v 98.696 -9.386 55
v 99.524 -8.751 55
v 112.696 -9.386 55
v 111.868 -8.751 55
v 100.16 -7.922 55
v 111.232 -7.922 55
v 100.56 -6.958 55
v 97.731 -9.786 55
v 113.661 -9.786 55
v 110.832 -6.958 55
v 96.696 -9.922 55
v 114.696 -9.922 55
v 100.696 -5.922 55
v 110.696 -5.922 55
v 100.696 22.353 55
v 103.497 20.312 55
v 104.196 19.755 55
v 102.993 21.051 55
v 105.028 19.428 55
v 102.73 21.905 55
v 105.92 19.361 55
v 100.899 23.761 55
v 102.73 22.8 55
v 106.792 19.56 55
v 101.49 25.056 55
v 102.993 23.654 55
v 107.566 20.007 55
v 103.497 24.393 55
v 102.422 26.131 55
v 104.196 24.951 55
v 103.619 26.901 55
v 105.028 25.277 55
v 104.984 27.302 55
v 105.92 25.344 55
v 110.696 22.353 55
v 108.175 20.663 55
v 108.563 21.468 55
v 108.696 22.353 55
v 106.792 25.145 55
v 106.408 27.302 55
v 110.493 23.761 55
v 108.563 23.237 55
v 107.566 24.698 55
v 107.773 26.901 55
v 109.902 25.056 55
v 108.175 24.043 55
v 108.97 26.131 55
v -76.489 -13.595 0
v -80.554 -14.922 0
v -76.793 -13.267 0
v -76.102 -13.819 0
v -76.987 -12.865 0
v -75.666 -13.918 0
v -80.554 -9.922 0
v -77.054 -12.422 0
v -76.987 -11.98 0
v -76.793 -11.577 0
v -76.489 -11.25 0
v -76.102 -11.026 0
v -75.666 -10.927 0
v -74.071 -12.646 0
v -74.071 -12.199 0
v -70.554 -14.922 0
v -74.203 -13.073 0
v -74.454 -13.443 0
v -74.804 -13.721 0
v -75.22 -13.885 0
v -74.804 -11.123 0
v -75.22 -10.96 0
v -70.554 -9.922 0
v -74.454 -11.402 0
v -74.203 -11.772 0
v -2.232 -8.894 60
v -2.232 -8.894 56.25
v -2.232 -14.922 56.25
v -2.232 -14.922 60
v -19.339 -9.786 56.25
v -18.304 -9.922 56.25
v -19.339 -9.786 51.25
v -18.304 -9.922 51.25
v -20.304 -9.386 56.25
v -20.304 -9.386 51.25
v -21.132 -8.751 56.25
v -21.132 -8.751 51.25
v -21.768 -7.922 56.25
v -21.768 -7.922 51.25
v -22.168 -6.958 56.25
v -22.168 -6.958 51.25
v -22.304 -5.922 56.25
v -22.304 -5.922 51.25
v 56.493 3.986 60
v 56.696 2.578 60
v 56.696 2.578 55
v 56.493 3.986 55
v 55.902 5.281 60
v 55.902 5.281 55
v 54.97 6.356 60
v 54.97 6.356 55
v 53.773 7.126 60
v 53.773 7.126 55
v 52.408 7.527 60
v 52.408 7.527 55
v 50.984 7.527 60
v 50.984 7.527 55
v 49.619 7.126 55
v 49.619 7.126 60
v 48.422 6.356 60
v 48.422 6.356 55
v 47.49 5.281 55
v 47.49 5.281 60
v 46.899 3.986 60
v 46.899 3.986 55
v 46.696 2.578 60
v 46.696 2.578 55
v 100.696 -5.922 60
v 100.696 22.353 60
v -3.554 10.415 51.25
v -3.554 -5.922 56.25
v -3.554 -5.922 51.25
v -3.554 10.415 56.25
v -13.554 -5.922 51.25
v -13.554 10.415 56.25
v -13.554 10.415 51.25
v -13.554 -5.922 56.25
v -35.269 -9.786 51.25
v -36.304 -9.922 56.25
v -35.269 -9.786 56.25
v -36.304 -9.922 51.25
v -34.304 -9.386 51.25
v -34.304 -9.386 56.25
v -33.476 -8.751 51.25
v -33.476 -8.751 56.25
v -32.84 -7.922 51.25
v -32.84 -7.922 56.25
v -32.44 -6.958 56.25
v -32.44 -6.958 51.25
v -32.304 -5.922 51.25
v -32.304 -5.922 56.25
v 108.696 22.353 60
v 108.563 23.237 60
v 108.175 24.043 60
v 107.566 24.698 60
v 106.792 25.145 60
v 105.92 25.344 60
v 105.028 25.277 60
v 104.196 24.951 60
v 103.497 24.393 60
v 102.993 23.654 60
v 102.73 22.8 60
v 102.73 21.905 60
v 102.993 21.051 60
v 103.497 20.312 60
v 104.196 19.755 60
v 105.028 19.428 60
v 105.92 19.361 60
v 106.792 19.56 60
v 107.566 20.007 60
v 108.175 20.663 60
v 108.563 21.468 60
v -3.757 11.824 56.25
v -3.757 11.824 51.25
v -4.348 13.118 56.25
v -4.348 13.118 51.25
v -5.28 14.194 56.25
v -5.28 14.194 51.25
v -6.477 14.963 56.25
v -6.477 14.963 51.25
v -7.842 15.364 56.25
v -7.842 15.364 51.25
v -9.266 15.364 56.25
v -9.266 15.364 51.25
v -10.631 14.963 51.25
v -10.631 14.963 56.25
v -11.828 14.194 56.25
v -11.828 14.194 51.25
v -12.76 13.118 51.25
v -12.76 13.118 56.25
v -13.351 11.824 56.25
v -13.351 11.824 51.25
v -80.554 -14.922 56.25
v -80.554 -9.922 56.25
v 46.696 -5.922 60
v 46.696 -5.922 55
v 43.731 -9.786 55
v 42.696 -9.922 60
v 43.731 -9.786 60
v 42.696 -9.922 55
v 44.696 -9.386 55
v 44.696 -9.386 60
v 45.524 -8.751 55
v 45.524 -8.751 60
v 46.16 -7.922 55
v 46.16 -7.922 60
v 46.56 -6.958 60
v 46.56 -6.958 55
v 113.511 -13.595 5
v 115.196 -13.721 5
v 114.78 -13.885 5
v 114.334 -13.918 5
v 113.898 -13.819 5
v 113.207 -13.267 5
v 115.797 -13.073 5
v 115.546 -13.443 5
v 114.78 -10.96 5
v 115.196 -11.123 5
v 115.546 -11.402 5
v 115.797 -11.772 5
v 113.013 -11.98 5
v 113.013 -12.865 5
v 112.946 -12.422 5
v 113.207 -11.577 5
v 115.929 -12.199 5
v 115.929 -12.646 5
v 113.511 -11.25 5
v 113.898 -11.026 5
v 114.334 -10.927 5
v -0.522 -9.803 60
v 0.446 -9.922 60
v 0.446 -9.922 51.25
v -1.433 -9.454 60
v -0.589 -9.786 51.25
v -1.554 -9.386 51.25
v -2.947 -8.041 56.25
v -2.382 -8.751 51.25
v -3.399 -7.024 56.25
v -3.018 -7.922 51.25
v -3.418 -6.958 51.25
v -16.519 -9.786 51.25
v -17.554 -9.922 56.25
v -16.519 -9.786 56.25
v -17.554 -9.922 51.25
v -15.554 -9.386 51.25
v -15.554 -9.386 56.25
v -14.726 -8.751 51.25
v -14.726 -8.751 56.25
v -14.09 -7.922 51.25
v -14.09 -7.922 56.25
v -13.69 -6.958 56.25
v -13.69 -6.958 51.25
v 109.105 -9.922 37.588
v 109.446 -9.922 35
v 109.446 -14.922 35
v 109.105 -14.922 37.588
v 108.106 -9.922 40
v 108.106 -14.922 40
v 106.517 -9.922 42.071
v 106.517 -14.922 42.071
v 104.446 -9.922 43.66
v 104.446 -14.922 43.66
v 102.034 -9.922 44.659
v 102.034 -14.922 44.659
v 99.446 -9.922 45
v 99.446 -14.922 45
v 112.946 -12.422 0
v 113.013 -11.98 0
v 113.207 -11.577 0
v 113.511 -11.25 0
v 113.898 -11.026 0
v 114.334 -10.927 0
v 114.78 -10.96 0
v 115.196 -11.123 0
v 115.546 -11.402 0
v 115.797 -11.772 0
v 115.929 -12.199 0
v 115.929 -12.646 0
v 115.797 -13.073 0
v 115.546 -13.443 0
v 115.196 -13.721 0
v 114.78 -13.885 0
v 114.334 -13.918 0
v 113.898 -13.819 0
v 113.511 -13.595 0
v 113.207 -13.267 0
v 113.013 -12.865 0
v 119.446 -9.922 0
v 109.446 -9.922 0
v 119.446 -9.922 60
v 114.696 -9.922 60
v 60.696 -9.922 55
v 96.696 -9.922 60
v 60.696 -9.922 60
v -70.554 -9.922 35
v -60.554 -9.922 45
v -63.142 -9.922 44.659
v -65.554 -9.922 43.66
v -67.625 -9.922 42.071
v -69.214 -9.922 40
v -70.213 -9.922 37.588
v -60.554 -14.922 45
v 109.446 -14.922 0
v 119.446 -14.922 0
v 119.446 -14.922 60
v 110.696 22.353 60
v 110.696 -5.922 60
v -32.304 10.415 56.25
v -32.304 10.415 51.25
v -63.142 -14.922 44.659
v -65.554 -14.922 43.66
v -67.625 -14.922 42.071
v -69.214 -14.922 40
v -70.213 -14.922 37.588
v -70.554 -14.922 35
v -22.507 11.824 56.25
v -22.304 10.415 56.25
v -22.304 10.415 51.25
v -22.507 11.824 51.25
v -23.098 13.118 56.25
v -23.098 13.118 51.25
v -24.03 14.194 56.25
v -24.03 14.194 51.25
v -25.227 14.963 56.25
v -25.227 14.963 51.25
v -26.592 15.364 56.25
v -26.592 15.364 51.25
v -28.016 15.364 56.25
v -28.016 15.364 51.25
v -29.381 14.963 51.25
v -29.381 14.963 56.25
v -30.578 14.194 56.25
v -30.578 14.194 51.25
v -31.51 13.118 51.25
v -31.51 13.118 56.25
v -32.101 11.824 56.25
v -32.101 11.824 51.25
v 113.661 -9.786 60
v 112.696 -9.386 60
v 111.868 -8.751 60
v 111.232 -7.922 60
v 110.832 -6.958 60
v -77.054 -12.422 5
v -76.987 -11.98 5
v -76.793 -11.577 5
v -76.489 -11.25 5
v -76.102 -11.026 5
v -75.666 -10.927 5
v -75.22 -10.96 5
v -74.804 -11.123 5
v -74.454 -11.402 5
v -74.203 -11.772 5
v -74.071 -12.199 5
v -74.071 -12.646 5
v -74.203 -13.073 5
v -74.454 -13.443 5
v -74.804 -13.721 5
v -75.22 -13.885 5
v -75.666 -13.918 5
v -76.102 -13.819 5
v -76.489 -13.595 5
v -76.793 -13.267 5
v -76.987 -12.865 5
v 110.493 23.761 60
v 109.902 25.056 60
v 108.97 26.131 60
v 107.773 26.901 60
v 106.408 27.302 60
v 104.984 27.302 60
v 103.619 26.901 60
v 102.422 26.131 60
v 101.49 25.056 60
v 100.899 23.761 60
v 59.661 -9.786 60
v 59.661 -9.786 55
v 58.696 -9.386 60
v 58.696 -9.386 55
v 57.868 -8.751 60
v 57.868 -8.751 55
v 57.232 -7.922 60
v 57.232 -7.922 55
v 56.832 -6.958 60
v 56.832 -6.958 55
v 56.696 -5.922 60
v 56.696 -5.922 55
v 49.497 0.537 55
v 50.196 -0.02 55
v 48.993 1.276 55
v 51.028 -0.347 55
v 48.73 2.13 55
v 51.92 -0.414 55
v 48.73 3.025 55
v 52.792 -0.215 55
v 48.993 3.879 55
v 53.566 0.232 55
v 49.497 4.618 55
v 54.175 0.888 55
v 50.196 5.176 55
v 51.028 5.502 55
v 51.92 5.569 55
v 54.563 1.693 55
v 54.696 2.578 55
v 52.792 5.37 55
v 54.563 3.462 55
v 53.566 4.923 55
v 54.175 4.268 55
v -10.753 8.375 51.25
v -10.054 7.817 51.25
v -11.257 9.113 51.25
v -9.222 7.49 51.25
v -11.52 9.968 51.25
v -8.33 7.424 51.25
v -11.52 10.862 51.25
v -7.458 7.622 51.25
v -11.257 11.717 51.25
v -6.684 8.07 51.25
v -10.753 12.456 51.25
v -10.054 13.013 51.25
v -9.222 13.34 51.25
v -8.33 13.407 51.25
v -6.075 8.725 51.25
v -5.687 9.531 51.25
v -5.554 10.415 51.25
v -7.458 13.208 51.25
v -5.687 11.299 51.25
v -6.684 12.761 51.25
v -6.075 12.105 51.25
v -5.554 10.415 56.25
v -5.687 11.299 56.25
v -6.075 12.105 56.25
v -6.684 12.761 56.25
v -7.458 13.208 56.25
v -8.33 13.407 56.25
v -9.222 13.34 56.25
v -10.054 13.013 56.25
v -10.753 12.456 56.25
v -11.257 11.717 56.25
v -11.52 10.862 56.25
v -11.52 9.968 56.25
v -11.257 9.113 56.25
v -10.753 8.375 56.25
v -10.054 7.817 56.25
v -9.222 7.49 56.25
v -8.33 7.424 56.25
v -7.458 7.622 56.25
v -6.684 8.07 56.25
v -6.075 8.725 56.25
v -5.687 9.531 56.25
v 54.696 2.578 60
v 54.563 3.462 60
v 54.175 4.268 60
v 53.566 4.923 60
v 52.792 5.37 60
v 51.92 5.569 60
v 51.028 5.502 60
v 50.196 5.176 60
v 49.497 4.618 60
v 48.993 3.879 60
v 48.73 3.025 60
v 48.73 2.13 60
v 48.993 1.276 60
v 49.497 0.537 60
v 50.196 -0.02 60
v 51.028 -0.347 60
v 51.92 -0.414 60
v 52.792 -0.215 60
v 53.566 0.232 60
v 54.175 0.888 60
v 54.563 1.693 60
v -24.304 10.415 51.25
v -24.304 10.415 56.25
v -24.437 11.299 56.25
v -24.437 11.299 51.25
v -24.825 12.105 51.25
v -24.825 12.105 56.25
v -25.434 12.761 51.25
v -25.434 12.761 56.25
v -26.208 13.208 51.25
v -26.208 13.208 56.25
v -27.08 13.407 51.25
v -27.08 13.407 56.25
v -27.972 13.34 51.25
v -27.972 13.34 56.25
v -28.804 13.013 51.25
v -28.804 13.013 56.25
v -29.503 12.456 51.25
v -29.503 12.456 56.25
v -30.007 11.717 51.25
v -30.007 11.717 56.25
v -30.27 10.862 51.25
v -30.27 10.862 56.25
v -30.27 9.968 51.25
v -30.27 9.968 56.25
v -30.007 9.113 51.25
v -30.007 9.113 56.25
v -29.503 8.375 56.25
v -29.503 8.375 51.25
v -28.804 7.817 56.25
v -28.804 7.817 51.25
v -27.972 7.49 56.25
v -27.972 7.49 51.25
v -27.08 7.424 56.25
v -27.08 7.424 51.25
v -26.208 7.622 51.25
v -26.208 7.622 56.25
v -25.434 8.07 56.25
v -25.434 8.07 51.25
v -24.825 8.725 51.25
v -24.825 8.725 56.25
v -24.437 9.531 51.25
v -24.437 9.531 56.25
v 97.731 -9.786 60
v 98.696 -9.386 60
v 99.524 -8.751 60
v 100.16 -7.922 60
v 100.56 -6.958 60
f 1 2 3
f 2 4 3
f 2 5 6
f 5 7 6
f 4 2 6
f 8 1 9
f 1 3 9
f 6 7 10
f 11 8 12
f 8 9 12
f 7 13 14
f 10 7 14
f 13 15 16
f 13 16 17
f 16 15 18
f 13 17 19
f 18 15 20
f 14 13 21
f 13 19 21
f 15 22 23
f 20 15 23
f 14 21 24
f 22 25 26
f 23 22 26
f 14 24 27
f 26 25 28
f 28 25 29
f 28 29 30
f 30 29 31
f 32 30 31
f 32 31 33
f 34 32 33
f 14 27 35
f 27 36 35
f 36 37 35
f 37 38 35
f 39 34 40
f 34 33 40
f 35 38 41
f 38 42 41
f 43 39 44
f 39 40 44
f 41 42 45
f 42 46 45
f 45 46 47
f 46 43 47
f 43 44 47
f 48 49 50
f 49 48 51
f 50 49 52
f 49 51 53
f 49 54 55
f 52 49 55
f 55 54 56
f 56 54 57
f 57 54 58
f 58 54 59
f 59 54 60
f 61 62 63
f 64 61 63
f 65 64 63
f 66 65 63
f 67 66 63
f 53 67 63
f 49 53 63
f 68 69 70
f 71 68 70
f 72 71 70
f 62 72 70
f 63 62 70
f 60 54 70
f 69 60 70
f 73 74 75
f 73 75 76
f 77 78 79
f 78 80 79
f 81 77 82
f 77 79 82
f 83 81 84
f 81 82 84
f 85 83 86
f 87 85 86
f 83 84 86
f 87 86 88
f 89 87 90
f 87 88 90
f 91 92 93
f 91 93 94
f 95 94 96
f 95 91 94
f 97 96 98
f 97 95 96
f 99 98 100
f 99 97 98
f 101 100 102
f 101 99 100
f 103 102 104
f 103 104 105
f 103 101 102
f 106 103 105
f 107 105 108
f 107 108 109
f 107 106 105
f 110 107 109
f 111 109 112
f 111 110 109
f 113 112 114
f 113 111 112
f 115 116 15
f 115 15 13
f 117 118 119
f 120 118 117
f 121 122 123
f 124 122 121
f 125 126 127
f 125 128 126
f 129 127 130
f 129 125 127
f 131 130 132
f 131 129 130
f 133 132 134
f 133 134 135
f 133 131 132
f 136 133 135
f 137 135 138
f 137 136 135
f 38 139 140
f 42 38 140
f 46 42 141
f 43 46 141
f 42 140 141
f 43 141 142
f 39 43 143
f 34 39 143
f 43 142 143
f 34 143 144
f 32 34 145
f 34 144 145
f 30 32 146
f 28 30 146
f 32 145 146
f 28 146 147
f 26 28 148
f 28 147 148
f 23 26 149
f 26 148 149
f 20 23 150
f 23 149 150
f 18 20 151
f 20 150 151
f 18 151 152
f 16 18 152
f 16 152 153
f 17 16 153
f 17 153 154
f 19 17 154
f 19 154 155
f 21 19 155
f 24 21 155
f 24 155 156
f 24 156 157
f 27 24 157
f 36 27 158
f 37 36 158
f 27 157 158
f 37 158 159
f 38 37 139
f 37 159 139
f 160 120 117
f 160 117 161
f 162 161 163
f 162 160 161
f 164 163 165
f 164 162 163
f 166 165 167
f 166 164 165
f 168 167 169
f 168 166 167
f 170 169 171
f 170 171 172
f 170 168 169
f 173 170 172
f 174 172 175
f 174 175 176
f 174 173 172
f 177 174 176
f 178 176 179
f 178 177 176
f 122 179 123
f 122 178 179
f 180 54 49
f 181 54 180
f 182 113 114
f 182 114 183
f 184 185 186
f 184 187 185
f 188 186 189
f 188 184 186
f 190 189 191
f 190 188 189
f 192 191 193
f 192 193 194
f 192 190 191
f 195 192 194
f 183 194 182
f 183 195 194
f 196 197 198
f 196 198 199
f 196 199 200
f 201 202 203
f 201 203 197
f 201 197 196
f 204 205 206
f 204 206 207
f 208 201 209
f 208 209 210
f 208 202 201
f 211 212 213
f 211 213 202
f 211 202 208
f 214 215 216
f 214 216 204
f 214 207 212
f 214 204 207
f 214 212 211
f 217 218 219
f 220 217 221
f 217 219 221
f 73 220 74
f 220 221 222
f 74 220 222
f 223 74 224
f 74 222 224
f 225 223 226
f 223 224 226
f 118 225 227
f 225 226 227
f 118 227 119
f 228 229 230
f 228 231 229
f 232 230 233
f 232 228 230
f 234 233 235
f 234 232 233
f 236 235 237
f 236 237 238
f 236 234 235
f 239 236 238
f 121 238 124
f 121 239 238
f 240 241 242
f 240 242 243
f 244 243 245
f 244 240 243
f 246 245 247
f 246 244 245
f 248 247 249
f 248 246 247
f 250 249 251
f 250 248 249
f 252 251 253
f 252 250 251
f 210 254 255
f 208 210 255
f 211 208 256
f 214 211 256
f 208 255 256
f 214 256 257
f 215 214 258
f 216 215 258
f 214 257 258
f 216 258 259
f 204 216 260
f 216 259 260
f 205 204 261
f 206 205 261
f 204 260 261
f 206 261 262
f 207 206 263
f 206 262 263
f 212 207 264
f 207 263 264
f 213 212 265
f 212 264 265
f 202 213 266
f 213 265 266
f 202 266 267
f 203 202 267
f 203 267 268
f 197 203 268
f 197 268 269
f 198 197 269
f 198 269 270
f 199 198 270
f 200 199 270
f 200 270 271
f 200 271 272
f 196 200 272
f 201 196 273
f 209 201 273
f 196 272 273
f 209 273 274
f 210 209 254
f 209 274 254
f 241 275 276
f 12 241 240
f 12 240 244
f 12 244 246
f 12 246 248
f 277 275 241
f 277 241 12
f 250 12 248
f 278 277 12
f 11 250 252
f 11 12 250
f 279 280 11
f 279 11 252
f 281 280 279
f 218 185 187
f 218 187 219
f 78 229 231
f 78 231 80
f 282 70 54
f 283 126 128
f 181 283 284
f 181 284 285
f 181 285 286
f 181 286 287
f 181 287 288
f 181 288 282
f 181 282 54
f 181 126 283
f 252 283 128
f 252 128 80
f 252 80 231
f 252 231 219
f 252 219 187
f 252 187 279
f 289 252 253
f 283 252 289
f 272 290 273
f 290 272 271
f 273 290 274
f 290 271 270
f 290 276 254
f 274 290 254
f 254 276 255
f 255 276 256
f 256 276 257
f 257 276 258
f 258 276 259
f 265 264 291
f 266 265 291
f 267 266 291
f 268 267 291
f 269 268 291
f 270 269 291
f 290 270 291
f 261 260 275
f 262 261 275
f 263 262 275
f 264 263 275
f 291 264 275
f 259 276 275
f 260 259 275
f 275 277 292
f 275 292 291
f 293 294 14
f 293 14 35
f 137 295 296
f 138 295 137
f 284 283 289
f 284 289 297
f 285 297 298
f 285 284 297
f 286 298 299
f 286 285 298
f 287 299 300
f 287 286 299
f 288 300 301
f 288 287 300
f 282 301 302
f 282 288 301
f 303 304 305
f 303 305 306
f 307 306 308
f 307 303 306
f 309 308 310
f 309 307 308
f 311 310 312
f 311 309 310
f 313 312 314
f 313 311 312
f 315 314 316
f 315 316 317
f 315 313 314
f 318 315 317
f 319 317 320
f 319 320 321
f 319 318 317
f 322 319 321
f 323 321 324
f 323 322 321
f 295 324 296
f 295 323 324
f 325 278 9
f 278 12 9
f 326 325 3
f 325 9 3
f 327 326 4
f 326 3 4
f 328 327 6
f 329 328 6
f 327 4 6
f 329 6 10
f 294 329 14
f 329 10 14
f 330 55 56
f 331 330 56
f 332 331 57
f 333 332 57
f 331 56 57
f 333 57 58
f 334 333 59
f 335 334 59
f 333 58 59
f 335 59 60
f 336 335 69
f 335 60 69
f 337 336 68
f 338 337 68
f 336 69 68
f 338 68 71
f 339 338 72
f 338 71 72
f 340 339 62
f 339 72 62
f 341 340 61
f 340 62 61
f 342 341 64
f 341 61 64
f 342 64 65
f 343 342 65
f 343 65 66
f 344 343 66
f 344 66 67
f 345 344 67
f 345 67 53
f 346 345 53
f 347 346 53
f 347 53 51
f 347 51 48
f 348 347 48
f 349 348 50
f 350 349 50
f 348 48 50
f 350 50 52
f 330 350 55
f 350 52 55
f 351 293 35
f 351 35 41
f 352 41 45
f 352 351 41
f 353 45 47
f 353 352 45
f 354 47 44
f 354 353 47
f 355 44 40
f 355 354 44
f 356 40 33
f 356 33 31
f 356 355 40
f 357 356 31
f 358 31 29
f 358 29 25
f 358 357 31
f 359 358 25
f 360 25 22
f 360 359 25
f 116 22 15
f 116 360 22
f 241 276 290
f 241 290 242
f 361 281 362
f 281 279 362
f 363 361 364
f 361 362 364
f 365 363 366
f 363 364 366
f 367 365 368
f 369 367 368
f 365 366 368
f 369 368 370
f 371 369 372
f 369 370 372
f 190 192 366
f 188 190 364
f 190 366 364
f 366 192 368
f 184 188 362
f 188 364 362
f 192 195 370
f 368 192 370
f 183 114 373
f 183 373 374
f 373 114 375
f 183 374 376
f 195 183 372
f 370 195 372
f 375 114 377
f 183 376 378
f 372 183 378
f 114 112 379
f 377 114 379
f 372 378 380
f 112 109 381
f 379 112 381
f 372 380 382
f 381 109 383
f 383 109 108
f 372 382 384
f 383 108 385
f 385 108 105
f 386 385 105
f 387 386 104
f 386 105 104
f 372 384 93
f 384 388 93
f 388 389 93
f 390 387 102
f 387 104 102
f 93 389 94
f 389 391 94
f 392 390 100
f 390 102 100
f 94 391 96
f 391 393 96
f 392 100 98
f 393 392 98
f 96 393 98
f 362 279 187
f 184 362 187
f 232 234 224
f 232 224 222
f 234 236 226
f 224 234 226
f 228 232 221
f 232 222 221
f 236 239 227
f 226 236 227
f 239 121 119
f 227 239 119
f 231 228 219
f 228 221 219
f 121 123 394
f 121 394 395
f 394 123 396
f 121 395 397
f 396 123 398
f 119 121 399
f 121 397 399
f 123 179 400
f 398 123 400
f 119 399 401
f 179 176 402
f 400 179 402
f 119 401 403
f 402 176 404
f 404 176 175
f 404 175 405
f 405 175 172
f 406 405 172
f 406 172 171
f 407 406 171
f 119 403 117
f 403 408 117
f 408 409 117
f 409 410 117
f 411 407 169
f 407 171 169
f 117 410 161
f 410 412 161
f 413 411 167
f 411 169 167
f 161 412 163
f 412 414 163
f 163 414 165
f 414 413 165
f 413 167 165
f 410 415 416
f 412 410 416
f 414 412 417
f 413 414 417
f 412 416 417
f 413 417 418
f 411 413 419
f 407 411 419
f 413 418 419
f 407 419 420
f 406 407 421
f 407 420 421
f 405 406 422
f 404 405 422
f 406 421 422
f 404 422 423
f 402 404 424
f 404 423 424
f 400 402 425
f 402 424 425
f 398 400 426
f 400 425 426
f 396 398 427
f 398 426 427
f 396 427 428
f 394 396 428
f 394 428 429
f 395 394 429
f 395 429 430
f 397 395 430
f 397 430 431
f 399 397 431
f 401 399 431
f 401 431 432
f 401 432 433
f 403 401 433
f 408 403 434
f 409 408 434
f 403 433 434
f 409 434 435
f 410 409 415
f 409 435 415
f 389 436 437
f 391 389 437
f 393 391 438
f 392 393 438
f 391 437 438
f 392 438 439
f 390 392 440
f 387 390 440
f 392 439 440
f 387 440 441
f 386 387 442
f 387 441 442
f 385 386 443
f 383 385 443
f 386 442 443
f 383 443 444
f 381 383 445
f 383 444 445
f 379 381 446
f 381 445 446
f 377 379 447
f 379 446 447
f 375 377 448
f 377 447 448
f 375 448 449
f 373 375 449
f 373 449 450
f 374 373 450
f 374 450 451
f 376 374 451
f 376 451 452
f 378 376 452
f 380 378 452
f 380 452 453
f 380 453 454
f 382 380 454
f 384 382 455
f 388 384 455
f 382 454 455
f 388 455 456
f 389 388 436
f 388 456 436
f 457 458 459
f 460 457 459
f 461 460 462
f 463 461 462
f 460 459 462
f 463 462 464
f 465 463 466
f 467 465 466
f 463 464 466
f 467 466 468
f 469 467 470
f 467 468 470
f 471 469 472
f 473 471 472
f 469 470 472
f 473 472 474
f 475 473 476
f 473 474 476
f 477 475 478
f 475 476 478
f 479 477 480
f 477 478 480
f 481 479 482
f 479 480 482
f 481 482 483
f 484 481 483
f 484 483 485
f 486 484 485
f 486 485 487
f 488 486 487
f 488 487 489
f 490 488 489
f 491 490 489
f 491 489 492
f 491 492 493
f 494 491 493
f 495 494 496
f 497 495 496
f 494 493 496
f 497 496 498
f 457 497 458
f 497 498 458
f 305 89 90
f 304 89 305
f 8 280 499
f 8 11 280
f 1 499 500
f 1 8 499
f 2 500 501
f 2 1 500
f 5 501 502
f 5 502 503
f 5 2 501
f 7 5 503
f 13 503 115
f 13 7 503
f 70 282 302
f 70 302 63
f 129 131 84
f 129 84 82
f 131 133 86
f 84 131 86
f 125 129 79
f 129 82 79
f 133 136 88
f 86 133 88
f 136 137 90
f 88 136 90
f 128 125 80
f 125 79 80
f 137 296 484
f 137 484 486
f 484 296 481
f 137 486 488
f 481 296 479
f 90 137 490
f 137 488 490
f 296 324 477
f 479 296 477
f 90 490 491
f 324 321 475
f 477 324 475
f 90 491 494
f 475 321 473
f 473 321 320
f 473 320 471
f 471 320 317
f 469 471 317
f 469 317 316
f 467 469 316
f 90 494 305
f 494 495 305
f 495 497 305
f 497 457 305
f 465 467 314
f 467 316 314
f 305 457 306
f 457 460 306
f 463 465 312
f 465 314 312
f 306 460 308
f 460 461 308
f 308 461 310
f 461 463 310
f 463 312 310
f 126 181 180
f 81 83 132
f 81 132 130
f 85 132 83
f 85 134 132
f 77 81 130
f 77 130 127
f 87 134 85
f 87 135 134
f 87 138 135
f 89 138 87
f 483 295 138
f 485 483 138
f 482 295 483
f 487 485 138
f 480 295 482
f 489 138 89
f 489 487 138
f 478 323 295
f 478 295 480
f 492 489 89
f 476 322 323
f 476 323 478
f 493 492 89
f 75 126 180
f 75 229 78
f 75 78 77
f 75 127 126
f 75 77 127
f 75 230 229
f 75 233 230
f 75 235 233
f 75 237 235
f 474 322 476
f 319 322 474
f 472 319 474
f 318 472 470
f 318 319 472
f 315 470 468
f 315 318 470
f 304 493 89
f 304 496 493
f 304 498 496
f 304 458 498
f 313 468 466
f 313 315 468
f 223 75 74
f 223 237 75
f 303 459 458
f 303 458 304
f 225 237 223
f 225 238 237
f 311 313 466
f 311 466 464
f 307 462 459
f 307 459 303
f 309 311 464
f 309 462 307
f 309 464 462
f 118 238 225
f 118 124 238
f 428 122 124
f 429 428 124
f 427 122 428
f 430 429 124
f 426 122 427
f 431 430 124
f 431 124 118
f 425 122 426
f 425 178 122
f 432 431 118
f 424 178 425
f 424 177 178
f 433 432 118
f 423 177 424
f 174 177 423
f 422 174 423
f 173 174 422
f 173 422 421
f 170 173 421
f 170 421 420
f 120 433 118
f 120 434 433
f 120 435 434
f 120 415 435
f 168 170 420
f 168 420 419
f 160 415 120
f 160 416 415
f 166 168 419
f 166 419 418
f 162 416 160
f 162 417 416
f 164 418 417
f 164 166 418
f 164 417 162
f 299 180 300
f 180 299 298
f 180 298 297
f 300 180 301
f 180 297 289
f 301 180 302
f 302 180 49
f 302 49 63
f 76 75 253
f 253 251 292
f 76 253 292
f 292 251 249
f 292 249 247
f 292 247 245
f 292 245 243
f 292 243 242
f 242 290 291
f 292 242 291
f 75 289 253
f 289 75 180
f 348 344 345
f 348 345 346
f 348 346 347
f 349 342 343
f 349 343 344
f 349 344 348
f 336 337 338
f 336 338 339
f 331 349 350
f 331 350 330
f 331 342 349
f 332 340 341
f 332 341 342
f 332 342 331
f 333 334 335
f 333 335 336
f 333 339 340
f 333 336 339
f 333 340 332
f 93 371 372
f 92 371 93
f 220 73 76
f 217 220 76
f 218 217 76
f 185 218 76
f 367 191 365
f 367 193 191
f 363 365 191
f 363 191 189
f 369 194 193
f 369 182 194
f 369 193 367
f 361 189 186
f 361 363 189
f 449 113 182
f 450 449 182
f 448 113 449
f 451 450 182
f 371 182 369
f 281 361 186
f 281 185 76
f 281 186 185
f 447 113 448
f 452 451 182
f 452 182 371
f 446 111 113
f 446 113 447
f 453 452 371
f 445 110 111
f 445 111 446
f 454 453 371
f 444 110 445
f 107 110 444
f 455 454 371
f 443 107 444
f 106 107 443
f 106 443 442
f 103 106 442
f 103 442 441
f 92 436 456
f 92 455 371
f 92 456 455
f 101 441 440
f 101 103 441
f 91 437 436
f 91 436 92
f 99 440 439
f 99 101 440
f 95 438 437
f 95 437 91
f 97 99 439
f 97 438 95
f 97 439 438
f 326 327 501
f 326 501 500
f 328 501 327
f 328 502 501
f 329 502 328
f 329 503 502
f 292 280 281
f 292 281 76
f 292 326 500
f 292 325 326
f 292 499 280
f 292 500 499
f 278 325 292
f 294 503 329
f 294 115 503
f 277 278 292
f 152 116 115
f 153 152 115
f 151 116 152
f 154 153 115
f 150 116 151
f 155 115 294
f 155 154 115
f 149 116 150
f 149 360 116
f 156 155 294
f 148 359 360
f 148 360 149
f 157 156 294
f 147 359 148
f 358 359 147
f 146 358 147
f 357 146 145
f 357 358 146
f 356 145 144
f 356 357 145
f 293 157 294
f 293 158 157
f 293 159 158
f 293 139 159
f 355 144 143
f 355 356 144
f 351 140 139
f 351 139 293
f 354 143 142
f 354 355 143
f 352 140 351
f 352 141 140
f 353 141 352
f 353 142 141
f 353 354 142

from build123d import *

# Parameters (mm, degrees)
BOSS_EXTRUDE1_DEPTH     = 40
SKETCH2_R               = 24
BOSS_EXTRUDE2_DEPTH     = 40
SKETCH3_R               = 24
BOSS_EXTRUDE3_DEPTH     = 40
SCALE1_SCALE            = 0.125
FILLET3_R               = 4
FILLET4_R               = 4
CUT_EXTRUDE1_DEPTH      = 38.275
CUT_EXTRUDE1_DEPTH_BACK = 6
SKETCH5_OUTSIDE_W       = 249.408
SKETCH5_OUTSIDE_H       = 169.408
CUT_EXTRUDE2_DEPTH      = 38.275
CUT_EXTRUDE2_DEPTH_BACK = 6
SKETCH7_R               = 1.5
CUT_EXTRUDE3_DEPTH      = 5


with BuildPart() as part:
    # Sketch1 → Boss-Extrude1 (new body)
    with BuildSketch(Plane(origin=(0, 0, 0), x_dir=(1, 0, 0), z_dir=(0, 1, 0))):
        Polygon((-173.422280891, 480), (-173.422280891, 450), (-800, 450), (-800, -450), (-173.422280891, -450), (-173.422280891, -480), (800, -480), (800, 480), align=None)
    extrude(amount=-BOSS_EXTRUDE1_DEPTH)

    # Sketch2 → Boss-Extrude2 (add)
    with BuildSketch(Plane.XY.offset(480)):
        with BuildLine():
            Line((218, 0), (298, 0))
            Line((298, 0), (298, 100))
            ThreePointArc((298, 100), (258, 140), (218, 100))
            Line((218, 100), (218, 0))
        make_face()
        with Locations((258, 100)):
            Circle(SKETCH2_R, mode=Mode.SUBTRACT)
        with BuildLine():
            Line((650, 258.2), (650, 0))
            Line((650, 0), (730, 0))
            Line((730, 0), (730, 258.2))
            ThreePointArc((730, 258.2), (690, 298.2), (650, 258.2))
        make_face()
        with Locations((690, 258.2)):
            Circle(SKETCH2_R, mode=Mode.SUBTRACT)
        Polygon((650, 0), (298, 0), (218, 0), (-173.422280891, 0), (-173.422280891, -40), (800, -40), (800, 0), (730, 0), align=None)
    extrude(amount=-BOSS_EXTRUDE2_DEPTH)

    # Mirror1: part across plane


with BuildPart() as part_1:
    add(part.part)
    add(part.part.mirror(Plane.XY))

    # Sketch3 → Boss-Extrude3 (add)
    with BuildSketch(Plane.XY.offset(450)):
        with BuildLine():
            Line((-414, 0), (-334, 0))
            Line((-334, 0), (-334, 162.7))
            ThreePointArc((-334, 162.7), (-374, 202.7), (-414, 162.7))
            Line((-414, 162.7), (-414, 0))
        make_face()
        with Locations((-374, 162.7)):
            Circle(SKETCH3_R, mode=Mode.SUBTRACT)
        with BuildLine():
            Line((-264, 0), (-184, 0))
            Line((-184, 0), (-184, 162.7))
            ThreePointArc((-184, 162.7), (-224, 202.7), (-264, 162.7))
            Line((-264, 162.7), (-264, 0))
        make_face()
        with Locations((-224, 162.7)):
            Circle(SKETCH3_R, mode=Mode.SUBTRACT)
    boss_extrude3 = extrude(amount=-BOSS_EXTRUDE3_DEPTH)

    # Mirror2: Boss-Extrude3 across plane
    add(boss_extrude3.mirror(Plane.XY))


with BuildPart() as part_2:
    # Scale1: scaled about (22.22402446, -11.339866564, 0)
    add(part_1.part.scale(SCALE1_SCALE).moved(Location((19.446021402, -9.922383243, 0))))

    # Fillet3
    fillet3_edges = [part_2.edges().sort_by_distance(p)[0] for p in [
        (-32.303978598, -9.922383243, 53.75),
        (-13.553978598, -9.922383243, 53.75),
        (-32.303978598, -9.922383243, -53.75),
        (-13.553978598, -9.922383243, -53.75),
        (46.696021403, -9.922383243, 57.5),
        (100.696021403, -9.922383243, 57.5),
        (100.696021403, -9.922383243, -57.5),
        (46.696021403, -9.922383243, -57.5),
    ]]
    fillet(fillet3_edges, radius=FILLET3_R)

    # Fillet4
    fillet4_edges = [part_2.edges().sort_by_distance(p)[0] for p in [
        (-3.553978598, -9.922383243, -53.75),
        (-22.303978598, -9.922383243, -53.75),
        (56.696021403, -9.922383243, -57.5),
        (110.696021402, -9.922383243, -57.5),
        (110.696021402, -9.922383243, 57.5),
        (56.696021403, -9.922383243, 57.5),
        (-3.553978598, -9.922383243, 53.75),
        (-22.303978598, -9.922383243, 53.75),
    ]]
    fillet(fillet4_edges, radius=FILLET4_R)

    # Sketch4 → Cut-Extrude1 (cut, two sides)
    with BuildSketch(Plane(origin=(0, -9.922383244, 0), x_dir=(1, 0, 0), z_dir=(0, 1, 0))) as cut_extrude1_sk:
        with BuildLine():
            Line((-60.553978598, 45), (99.446021402, 45))
            ThreePointArc((99.446021402, 45), (106.517089214, 42.071067812), (109.446021402, 35))
            Line((109.446021402, 35), (109.446021402, -35))
            ThreePointArc((109.446021402, -35), (106.517089214, -42.071067812), (99.446021402, -45))
            Line((99.446021402, -45), (-60.553978598, -45))
            ThreePointArc((-60.553978598, -45), (-67.62504641, -42.071067812), (-70.553978598, -35))
            Line((-70.553978598, -35), (-70.553978598, 35))
            ThreePointArc((-70.553978598, 35), (-67.62504641, 42.071067812), (-60.553978598, 45))
        make_face()
    extrude(amount=CUT_EXTRUDE1_DEPTH, mode=Mode.SUBTRACT)
    extrude(cut_extrude1_sk.sketch, amount=-CUT_EXTRUDE1_DEPTH_BACK, mode=Mode.SUBTRACT)

    # Sketch5 outside → Cut-Extrude2 (cut, two sides)
    with BuildSketch(Plane(origin=(0, -9.922383244, 0), x_dir=(1, 0, 0), z_dir=(0, 1, 0))) as cut_extrude2_sk:
        with Locations((19.446, 0)):
            Rectangle(SKETCH5_OUTSIDE_W, SKETCH5_OUTSIDE_H)
        Polygon((0, 0), (123.509842575, 0), (123.509842575, -66.212941814), (-94.641009198, -66.212941814), (-94.641009198, 0), align=None, mode=Mode.SUBTRACT)
    extrude(amount=CUT_EXTRUDE2_DEPTH, mode=Mode.SUBTRACT)
    extrude(cut_extrude2_sk.sketch, amount=-CUT_EXTRUDE2_DEPTH_BACK, mode=Mode.SUBTRACT)

    # Sketch7 → Cut-Extrude3 (cut)
    with BuildSketch(Plane(origin=(0, 0, 0), x_dir=(-1, 0, 0), z_dir=(0, 0, -1))):
        with Locations((-114.446021402, -12.422383244)):
            Circle(SKETCH7_R)
        with Locations((75.553978598, -12.422383244)):
            Circle(SKETCH7_R)
    extrude(amount=-CUT_EXTRUDE3_DEPTH, mode=Mode.SUBTRACT)


solid = part_2.part
